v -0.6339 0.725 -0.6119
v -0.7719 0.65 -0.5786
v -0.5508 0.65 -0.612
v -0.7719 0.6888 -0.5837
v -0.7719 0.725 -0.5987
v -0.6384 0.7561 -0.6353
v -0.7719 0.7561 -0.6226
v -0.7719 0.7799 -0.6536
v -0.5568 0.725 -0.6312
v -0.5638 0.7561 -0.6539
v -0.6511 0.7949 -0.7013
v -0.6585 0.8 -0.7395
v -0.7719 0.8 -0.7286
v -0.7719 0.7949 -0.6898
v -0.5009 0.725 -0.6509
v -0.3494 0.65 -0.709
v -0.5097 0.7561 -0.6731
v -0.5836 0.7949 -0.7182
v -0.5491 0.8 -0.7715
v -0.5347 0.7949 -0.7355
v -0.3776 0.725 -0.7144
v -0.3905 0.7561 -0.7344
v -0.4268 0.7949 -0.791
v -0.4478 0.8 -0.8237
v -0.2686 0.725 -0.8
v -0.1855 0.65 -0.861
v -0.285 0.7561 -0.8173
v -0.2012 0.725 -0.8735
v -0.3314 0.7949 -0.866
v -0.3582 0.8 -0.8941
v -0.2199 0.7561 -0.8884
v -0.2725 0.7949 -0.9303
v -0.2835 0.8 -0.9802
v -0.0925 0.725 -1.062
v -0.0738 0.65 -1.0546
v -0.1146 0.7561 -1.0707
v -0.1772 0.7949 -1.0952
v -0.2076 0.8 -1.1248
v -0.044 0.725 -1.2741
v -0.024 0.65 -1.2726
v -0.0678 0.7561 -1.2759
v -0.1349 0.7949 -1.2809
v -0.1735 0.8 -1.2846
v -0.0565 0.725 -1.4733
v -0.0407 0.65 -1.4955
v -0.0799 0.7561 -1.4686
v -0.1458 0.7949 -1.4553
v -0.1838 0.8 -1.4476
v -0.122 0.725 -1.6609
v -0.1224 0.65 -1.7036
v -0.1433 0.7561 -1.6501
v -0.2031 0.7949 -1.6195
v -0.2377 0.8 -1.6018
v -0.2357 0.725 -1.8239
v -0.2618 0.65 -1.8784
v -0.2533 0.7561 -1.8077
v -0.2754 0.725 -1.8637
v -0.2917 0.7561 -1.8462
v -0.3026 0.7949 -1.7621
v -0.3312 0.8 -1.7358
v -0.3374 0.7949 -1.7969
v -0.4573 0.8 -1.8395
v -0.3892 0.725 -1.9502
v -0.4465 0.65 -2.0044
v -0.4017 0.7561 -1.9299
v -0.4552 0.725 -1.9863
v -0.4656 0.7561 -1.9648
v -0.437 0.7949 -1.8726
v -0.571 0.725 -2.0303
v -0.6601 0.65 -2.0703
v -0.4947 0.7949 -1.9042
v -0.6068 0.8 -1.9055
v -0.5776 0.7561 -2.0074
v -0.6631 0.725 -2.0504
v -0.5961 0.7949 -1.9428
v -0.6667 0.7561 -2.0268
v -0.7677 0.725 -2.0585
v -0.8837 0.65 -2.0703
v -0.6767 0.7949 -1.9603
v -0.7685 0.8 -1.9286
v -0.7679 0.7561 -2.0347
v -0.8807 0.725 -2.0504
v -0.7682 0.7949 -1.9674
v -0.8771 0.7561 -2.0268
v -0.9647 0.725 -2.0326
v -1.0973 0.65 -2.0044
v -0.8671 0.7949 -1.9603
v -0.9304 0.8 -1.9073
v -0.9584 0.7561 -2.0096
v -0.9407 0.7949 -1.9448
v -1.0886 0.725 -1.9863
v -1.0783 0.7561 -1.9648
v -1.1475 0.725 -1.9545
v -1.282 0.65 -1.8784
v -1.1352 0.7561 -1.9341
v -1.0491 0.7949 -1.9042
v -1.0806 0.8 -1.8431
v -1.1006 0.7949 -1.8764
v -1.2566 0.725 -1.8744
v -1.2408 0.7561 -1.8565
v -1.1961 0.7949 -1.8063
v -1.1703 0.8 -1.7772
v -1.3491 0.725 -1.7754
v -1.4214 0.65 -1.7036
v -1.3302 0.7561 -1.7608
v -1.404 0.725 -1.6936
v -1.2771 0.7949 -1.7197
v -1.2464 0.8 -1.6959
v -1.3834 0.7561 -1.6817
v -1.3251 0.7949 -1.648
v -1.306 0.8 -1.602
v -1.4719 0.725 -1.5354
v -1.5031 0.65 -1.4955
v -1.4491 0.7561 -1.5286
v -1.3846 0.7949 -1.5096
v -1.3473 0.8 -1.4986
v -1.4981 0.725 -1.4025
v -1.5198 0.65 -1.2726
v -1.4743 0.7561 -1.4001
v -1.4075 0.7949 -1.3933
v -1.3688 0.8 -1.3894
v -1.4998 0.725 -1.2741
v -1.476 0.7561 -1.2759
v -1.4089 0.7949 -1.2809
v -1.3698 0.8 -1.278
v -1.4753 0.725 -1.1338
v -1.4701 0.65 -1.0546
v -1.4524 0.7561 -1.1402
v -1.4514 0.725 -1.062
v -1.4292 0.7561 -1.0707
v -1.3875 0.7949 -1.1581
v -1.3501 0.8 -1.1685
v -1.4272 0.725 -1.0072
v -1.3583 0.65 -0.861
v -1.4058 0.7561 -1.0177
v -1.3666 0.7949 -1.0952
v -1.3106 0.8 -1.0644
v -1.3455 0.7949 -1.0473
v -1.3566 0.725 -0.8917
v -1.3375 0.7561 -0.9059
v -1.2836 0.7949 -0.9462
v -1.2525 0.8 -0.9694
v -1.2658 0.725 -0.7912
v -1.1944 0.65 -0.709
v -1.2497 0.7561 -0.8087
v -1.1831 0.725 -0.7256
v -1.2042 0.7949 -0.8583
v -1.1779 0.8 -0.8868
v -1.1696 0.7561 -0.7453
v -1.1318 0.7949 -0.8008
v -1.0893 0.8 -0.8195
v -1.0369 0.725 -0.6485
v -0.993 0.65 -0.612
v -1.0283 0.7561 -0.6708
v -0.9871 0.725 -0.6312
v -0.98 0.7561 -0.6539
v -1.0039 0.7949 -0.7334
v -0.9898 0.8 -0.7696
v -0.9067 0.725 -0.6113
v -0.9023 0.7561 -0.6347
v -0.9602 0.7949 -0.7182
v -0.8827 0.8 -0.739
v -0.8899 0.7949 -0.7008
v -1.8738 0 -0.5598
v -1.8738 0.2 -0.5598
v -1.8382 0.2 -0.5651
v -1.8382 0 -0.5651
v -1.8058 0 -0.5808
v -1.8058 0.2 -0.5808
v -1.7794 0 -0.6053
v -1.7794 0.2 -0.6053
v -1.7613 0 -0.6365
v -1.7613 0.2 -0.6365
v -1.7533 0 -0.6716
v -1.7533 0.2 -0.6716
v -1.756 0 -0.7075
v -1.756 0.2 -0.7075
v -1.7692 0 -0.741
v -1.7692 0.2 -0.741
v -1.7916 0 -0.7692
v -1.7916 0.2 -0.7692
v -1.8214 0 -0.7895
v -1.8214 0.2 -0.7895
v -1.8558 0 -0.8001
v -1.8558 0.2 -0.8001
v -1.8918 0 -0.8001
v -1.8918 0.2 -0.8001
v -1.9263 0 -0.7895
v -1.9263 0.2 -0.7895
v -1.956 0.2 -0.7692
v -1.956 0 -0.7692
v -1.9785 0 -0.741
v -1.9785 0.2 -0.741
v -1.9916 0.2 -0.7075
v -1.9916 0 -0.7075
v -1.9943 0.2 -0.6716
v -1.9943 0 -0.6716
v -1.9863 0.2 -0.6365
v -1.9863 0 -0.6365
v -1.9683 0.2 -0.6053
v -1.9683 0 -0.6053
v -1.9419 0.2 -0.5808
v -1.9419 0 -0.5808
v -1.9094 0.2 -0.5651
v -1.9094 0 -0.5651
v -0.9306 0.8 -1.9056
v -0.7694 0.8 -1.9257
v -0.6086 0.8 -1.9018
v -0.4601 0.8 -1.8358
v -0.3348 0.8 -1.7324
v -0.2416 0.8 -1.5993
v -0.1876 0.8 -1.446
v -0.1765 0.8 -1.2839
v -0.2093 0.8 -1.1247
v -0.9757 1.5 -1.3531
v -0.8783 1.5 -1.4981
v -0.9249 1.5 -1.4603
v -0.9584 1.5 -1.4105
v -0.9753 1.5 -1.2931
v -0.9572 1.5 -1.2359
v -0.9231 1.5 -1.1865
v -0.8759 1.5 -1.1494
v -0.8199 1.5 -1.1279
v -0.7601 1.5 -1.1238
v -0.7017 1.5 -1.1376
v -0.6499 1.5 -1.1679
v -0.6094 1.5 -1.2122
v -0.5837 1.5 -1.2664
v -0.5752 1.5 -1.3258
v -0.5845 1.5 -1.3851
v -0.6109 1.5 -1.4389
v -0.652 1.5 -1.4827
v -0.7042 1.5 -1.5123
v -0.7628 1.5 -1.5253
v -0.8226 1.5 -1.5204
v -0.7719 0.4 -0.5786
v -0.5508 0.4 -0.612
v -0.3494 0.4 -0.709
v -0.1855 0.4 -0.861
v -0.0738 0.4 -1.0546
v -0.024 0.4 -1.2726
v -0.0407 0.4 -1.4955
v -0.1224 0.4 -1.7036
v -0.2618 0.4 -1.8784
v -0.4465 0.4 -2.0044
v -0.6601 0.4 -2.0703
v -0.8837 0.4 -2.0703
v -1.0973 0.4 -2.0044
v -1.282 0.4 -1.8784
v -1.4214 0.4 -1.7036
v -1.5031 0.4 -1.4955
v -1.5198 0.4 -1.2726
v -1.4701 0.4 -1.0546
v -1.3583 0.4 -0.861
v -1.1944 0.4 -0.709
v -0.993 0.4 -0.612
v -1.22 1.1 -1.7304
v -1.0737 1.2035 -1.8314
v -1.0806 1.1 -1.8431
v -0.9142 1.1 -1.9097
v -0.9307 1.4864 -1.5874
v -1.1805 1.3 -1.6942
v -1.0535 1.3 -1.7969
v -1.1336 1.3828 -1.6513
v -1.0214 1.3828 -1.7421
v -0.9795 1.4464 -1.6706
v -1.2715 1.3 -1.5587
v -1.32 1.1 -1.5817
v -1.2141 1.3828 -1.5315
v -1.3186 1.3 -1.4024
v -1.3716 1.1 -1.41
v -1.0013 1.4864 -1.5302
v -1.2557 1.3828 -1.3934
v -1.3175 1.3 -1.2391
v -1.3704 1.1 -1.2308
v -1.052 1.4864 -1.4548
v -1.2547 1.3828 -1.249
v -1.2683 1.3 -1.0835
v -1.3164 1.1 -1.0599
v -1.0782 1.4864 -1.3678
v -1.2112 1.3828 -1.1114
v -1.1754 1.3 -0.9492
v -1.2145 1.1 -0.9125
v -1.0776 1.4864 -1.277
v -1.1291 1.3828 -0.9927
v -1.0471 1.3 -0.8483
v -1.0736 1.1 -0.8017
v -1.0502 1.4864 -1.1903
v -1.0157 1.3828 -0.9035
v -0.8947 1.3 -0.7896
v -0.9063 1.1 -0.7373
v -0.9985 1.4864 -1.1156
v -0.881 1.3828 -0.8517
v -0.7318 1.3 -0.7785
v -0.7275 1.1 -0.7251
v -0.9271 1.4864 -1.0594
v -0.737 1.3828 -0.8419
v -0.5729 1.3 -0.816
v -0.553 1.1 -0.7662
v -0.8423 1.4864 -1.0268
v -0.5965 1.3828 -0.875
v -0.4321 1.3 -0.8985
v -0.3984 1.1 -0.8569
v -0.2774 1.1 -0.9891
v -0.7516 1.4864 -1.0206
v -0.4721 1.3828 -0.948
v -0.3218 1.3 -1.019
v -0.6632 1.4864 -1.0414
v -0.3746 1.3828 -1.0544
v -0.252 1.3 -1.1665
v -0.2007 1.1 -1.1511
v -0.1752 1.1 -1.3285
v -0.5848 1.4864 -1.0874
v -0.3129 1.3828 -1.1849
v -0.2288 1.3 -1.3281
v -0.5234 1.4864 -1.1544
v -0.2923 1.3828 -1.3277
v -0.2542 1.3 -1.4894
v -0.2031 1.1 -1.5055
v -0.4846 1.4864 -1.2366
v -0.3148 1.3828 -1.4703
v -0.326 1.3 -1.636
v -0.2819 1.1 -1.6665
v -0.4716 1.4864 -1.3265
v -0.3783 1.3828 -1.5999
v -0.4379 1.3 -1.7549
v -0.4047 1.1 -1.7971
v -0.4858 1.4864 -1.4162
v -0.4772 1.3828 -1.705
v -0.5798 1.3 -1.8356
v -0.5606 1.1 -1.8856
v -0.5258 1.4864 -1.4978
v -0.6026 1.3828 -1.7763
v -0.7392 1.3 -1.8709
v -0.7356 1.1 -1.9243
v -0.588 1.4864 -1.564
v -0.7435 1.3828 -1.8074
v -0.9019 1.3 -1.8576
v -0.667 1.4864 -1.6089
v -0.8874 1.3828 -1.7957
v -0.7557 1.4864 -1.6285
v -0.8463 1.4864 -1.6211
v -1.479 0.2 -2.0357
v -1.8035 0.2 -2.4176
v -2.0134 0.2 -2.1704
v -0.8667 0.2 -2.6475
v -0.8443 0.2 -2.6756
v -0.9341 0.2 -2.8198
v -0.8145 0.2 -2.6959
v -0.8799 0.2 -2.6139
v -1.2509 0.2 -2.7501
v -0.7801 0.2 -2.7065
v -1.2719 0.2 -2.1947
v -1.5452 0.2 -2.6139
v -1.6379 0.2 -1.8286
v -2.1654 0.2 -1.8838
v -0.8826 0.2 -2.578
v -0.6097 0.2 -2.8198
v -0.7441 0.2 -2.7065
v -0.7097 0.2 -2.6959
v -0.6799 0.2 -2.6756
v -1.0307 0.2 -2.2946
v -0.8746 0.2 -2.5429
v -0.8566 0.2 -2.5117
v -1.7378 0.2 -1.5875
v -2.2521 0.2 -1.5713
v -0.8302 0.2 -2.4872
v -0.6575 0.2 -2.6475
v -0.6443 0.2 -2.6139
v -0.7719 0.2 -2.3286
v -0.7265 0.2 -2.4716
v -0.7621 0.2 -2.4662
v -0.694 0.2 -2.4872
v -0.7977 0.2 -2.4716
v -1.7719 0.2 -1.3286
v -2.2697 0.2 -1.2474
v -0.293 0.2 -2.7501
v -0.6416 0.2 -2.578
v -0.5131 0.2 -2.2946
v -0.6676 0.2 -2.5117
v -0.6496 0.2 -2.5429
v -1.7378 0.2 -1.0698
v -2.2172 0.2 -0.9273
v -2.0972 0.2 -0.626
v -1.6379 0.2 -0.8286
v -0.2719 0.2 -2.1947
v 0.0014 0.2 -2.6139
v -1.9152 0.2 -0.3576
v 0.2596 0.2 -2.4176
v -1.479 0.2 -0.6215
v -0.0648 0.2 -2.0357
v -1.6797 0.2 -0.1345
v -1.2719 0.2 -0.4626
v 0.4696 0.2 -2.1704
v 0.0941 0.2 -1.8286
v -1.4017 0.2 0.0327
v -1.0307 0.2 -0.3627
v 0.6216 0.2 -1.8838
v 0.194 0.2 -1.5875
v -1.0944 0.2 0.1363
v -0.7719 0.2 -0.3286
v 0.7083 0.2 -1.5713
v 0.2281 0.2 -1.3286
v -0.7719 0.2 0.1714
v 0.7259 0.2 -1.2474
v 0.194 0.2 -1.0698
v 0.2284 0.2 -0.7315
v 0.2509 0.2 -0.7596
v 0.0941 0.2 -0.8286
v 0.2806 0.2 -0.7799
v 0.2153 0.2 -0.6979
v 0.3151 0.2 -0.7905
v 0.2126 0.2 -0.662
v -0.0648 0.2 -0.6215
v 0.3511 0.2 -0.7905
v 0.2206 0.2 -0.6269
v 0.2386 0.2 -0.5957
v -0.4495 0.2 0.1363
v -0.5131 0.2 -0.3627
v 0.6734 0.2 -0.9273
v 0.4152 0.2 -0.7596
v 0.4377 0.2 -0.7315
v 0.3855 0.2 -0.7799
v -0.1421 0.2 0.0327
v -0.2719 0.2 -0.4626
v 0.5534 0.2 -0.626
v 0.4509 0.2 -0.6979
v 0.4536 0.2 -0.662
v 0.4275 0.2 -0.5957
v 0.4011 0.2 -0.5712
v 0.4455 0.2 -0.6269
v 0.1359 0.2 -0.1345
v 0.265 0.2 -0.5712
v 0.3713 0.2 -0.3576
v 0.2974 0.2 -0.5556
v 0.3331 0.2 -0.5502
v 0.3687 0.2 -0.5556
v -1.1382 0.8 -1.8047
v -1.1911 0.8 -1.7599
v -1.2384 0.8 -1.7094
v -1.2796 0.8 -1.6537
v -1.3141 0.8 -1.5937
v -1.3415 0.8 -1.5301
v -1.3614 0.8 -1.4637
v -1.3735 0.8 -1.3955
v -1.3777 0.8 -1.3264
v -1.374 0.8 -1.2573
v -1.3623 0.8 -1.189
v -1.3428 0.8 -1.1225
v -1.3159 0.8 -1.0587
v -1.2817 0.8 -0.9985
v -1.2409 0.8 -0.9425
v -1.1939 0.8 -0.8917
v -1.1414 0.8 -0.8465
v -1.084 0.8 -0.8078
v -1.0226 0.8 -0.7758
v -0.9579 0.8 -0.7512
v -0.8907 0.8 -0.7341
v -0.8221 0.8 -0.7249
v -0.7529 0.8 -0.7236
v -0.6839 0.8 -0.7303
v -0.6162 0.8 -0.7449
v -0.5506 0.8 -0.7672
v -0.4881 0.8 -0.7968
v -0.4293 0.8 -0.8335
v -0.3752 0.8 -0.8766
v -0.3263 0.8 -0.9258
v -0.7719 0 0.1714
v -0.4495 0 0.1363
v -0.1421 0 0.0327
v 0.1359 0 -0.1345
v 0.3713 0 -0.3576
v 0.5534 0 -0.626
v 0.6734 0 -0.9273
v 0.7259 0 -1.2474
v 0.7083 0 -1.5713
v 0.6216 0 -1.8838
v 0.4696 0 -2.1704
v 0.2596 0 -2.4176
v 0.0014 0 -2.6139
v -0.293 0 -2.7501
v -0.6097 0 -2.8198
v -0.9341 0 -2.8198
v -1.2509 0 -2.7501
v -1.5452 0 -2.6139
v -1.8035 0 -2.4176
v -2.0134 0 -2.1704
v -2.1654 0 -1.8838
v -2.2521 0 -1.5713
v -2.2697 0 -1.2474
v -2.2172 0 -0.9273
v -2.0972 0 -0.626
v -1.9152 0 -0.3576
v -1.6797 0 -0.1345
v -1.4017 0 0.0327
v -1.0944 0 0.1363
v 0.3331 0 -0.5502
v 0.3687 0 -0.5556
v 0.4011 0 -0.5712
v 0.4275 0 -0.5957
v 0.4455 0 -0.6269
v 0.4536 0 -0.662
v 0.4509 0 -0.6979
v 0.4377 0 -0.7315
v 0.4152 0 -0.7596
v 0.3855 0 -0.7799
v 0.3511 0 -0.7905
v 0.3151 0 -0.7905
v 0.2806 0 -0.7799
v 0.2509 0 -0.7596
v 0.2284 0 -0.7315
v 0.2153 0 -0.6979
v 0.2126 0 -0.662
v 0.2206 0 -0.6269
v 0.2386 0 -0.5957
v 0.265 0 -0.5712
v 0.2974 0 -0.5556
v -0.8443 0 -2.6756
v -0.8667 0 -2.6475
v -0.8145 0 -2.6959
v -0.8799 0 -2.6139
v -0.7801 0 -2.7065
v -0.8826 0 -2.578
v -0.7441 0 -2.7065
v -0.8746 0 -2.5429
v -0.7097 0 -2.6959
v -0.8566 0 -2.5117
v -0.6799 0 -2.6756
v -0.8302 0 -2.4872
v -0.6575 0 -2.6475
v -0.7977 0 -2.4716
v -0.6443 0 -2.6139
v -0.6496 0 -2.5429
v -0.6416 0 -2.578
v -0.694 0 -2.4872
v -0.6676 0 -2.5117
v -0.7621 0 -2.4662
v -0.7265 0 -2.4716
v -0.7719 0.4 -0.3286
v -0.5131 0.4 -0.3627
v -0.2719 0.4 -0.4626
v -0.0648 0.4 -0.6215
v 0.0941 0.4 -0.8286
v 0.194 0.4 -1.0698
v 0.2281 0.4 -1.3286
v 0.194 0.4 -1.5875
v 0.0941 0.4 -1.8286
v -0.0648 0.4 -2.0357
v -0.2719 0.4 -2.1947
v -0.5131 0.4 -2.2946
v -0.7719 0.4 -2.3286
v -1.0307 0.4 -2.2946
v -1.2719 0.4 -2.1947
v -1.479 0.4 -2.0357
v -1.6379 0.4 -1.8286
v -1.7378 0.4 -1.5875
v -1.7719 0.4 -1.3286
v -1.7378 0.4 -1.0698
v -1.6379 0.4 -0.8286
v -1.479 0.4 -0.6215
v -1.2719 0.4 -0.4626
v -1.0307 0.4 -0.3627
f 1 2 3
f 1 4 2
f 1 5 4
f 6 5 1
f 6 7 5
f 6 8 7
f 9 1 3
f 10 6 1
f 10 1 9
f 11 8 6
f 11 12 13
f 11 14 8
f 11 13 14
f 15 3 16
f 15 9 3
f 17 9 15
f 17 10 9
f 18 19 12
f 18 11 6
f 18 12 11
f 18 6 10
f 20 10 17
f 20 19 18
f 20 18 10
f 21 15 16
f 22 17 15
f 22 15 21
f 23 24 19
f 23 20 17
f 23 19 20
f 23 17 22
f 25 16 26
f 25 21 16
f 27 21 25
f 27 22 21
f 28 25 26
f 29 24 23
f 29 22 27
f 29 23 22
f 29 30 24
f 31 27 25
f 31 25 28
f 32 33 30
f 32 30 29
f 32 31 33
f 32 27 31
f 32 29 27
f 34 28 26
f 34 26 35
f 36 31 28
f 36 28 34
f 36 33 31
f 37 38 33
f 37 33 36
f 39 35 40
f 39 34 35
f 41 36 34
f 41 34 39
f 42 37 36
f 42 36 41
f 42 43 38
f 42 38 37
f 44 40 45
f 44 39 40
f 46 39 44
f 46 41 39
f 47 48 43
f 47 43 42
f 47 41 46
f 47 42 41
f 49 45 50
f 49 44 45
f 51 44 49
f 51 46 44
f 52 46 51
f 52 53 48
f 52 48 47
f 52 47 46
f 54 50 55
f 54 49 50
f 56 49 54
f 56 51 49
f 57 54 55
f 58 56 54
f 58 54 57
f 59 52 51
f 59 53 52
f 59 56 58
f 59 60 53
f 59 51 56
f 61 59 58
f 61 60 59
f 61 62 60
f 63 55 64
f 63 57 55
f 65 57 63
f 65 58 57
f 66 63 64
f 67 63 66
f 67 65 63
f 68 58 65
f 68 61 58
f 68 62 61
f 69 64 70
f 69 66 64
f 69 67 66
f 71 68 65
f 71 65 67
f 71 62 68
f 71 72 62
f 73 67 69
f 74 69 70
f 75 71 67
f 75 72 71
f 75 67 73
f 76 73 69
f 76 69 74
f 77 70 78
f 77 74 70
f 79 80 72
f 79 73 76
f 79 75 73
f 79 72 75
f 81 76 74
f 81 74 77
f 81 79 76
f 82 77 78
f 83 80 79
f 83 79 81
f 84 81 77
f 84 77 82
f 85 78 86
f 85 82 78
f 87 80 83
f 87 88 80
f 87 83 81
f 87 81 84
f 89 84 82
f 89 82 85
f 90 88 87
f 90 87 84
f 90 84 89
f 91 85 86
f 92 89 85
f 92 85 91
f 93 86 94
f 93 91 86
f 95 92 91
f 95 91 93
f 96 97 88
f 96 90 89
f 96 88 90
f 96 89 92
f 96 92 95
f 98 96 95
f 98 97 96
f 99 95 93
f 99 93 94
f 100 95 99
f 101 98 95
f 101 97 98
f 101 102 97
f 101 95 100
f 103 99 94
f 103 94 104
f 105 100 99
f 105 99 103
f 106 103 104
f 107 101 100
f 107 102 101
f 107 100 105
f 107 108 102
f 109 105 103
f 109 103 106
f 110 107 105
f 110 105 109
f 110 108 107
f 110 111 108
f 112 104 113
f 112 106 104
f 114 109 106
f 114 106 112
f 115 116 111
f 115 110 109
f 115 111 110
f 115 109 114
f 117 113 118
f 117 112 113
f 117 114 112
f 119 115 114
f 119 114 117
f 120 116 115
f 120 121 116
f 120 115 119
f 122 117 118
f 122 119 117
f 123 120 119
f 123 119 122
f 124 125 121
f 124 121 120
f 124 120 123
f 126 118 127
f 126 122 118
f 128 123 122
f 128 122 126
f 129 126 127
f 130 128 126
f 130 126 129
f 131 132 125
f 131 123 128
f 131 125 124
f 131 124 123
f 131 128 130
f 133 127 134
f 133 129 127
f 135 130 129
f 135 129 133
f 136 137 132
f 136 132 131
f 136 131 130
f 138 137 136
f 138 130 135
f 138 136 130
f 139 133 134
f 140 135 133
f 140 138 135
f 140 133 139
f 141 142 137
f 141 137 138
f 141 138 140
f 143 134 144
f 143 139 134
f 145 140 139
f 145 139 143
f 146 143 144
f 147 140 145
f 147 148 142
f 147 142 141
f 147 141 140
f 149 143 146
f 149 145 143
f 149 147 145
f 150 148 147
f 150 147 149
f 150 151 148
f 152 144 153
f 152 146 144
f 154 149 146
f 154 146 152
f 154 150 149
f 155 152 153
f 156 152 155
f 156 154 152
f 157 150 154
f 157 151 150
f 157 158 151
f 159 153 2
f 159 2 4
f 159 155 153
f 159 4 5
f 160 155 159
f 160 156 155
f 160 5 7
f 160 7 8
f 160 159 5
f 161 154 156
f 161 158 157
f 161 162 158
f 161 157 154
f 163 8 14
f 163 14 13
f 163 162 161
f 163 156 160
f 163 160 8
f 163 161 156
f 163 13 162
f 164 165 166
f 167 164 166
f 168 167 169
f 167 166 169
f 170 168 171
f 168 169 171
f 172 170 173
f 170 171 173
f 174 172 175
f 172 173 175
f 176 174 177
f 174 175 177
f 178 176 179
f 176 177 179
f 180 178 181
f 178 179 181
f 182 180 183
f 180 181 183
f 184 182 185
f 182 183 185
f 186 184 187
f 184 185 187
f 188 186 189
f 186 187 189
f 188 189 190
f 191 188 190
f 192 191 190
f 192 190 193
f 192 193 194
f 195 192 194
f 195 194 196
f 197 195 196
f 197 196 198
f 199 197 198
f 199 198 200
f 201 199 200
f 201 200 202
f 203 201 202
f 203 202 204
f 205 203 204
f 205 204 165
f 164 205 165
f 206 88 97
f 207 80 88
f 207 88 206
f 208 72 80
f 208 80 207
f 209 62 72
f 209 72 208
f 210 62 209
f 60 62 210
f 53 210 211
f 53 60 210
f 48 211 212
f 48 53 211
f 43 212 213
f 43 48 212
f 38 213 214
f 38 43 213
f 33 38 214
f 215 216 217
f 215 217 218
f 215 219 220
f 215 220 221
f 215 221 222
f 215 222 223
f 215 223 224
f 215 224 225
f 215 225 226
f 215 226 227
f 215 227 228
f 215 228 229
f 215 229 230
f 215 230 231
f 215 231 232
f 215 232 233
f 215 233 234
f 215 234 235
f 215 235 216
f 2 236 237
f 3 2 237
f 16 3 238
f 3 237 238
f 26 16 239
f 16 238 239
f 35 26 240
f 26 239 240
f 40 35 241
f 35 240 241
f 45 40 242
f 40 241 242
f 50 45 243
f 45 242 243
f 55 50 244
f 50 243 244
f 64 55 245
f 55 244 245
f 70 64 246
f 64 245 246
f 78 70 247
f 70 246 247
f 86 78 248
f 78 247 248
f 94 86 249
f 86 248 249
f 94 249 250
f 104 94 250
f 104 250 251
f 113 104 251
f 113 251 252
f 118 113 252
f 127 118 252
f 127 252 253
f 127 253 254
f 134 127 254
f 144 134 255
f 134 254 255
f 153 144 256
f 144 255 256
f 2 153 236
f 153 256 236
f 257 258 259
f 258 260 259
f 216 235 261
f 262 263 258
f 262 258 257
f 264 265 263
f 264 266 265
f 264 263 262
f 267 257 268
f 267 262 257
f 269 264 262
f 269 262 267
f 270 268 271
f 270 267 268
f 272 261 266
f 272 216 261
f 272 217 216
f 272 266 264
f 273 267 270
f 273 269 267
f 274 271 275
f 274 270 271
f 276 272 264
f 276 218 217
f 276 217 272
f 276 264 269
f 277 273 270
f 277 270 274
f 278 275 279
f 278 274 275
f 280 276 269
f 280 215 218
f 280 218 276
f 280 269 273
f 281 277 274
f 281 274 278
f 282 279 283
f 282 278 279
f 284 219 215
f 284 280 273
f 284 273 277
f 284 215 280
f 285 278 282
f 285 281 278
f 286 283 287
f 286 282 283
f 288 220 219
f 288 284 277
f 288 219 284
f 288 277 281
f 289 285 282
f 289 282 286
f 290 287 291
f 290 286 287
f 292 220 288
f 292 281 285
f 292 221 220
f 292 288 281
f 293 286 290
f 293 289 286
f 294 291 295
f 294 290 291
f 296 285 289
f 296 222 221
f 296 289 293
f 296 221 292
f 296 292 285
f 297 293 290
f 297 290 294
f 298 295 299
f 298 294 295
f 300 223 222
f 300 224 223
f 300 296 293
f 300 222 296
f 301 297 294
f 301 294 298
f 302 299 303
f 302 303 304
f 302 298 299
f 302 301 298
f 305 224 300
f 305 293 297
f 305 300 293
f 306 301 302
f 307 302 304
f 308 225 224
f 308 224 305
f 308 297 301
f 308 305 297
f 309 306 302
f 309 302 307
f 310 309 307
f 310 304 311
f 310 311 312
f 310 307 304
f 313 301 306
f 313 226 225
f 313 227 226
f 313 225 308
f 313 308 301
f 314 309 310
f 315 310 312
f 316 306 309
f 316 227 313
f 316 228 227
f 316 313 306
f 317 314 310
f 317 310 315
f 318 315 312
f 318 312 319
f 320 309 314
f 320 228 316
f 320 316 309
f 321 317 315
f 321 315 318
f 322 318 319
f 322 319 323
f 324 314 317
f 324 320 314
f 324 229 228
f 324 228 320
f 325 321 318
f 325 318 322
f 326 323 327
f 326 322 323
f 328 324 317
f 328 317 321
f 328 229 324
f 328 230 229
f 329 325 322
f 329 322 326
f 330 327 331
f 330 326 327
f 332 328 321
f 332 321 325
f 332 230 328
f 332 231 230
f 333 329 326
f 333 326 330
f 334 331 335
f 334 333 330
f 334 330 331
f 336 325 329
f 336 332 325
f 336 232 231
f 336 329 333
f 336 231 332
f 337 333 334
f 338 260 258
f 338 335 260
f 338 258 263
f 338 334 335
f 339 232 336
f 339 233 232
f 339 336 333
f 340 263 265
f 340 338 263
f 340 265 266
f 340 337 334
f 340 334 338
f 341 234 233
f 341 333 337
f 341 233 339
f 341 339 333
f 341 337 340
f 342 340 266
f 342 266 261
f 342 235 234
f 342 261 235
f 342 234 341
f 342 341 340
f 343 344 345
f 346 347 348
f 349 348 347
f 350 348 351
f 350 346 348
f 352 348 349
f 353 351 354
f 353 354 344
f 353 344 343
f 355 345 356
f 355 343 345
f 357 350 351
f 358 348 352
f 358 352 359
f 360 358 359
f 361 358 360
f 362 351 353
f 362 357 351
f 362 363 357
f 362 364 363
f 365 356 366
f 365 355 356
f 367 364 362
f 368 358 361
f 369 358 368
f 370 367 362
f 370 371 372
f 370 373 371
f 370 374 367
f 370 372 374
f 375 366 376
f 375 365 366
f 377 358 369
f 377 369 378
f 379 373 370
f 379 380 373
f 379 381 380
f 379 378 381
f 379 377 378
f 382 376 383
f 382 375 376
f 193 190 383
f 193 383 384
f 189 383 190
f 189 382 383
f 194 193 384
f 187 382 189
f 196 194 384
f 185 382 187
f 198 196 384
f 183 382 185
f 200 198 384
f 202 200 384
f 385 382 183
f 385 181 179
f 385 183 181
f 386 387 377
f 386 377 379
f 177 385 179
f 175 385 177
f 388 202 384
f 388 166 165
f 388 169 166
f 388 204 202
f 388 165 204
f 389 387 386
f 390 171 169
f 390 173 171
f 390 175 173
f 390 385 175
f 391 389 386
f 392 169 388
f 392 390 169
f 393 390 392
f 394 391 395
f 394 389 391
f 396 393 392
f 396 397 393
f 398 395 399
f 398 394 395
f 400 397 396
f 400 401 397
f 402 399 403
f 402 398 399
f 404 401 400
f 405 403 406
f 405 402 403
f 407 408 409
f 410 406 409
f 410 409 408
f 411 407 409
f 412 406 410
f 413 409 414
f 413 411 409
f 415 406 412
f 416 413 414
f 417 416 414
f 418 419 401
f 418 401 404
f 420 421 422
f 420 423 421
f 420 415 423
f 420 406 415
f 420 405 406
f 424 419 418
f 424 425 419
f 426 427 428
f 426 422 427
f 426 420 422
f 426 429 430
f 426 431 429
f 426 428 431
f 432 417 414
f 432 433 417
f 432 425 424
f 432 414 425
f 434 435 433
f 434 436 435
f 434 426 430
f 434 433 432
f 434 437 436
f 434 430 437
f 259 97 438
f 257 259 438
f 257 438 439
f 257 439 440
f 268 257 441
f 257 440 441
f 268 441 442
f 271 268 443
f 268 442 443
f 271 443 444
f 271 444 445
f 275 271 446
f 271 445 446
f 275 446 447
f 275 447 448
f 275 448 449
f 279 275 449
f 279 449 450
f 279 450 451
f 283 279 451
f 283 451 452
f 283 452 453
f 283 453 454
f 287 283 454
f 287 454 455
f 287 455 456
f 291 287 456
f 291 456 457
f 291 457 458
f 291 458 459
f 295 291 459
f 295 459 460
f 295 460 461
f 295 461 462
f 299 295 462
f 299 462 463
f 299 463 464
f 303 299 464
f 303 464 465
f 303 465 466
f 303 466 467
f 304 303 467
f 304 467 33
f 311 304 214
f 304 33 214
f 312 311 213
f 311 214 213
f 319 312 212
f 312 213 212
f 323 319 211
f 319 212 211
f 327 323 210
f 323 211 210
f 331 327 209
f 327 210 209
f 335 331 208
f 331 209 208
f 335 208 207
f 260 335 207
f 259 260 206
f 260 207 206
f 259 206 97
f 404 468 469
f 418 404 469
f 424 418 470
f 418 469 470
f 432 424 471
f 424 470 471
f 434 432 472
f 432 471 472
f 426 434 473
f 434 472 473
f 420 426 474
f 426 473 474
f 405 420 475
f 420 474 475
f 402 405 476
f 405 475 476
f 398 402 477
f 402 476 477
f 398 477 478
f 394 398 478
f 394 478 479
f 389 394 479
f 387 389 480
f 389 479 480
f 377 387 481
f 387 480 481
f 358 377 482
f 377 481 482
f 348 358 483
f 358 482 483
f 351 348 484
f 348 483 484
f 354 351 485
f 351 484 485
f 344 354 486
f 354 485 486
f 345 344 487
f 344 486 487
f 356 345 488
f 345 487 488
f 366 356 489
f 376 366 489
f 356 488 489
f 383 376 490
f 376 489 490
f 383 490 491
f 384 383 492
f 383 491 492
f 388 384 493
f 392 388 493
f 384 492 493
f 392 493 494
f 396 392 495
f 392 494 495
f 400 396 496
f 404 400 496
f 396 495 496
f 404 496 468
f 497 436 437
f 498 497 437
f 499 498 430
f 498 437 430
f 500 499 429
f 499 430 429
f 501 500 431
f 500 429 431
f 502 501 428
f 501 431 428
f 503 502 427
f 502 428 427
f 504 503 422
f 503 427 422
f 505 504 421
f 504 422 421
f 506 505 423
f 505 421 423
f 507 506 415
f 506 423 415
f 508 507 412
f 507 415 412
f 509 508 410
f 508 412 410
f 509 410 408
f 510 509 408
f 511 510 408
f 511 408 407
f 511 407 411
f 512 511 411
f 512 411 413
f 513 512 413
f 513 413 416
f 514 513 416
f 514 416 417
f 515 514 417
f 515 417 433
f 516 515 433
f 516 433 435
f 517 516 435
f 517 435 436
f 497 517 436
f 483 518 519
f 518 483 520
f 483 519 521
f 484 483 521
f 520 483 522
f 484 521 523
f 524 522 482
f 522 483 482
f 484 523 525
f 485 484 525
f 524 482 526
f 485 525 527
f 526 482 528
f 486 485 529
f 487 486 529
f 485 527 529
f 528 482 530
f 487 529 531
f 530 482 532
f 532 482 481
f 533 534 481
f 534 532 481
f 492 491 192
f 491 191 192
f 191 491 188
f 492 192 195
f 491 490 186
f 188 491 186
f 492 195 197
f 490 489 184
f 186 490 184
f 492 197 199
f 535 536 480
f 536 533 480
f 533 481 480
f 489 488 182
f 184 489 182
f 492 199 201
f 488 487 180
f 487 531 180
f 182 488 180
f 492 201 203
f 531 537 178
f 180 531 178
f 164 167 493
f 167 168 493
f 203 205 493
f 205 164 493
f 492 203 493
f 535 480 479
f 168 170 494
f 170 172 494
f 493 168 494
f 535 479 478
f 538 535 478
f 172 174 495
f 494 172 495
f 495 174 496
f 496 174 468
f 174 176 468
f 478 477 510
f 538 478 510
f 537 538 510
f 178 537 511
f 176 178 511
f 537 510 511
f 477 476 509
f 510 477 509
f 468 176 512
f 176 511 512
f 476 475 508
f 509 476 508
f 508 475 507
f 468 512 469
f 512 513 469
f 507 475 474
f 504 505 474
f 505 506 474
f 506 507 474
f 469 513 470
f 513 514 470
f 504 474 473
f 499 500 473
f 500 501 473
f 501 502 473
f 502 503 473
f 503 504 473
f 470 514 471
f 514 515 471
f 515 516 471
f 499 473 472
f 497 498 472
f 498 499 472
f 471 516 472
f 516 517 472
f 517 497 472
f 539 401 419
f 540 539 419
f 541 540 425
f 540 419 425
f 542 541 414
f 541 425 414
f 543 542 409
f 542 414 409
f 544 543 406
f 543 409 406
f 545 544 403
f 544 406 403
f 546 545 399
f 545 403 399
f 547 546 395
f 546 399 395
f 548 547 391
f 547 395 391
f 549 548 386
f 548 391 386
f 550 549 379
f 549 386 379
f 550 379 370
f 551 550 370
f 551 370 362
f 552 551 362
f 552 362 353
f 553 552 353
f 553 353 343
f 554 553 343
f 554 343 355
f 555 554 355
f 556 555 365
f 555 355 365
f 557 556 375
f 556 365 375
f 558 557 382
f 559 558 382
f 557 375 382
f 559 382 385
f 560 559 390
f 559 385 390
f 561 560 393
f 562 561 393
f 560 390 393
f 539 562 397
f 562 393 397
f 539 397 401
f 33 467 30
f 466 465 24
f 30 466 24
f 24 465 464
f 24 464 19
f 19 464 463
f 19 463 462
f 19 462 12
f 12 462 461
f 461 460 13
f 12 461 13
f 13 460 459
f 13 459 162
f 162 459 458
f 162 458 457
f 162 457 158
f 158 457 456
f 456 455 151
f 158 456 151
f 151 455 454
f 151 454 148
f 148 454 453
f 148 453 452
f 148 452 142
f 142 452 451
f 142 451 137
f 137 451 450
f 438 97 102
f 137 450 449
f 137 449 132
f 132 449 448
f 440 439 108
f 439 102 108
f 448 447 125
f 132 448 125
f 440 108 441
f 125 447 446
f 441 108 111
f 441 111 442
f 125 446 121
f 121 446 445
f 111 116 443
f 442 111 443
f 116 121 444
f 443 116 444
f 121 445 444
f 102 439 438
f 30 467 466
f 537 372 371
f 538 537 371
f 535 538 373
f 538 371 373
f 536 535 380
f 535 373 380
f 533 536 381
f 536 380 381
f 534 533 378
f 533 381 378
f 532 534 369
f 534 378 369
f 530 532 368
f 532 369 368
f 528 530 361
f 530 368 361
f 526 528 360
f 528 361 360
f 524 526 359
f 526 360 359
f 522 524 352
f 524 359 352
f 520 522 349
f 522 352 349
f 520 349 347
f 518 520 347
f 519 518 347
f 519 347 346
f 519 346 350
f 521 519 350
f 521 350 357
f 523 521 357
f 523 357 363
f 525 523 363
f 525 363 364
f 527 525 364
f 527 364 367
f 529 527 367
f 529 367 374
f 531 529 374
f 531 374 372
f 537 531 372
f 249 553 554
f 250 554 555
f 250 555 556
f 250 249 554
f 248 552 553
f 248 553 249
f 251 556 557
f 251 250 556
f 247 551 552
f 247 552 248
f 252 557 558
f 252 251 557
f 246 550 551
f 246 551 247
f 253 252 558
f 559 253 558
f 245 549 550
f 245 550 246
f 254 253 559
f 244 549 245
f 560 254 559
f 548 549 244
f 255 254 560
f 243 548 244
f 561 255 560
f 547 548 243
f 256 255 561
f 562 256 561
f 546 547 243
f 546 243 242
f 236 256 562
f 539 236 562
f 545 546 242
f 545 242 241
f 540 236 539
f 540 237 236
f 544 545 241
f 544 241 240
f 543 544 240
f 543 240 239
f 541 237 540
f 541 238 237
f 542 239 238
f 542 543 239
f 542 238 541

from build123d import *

# Parameters (mm, degrees)
SKETCH1_R           = 1.5
BOSS_EXTRUDE1_DEPTH = 0.2
SKETCH2_R           = 1
BOSS_EXTRUDE2_DEPTH = 0.2
SKETCH3_R           = 0.75
BOSS_EXTRUDE3_DEPTH = 0.4
FILLET1_R           = 0.15
SKETCH7_R           = 0.601293839
BOSS_EXTRUDE4_DEPTH = 0.7
FILLET2_R           = 0.4
SKETCH8_R           = 0.120832219
CUT_EXTRUDE1_DEPTH  = 0.7


with BuildPart() as part:
    # Sketch1 → Boss-Extrude1 (new body)
    with BuildSketch(Plane(origin=(0, 0, 0), x_dir=(1, 0, 0), z_dir=(0, 1, 0))):
        with Locations(Location((-0.771907226, 1.328636773, 0), (0, 0, 270))):
            Circle(SKETCH1_R)
    extrude(amount=BOSS_EXTRUDE1_DEPTH)

    # Sketch2 → Boss-Extrude2 (add)
    with BuildSketch(Plane(origin=(0, 0.2, 0), x_dir=(1, 0, 0), z_dir=(0, 1, 0))):
        with Locations(Location((-0.771907226, 1.328636773, 0), (0, 0, 270))):
            Circle(SKETCH2_R)
    extrude(amount=BOSS_EXTRUDE2_DEPTH)

    # Sketch3 → Boss-Extrude3 (add)
    with BuildSketch(Plane(origin=(0, 0.4, 0), x_dir=(1, 0, 0), z_dir=(0, 1, 0))):
        with Locations(Location((-0.771907226, 1.328636773, 0), (0, 0, 270))):
            Circle(SKETCH3_R)
    extrude(amount=BOSS_EXTRUDE3_DEPTH)

    # Fillet1
    fillet1_edges = [part.edges().sort_by_distance(p)[0] for p in [
        (-0.771907226, 0.8, -2.078636773),
    ]]
    fillet(fillet1_edges, radius=FILLET1_R)

    # Sketch7 → Boss-Extrude4 (add)
    with BuildSketch(Plane(origin=(0, 0.8, 0), x_dir=(1, 0, 0), z_dir=(0, 1, 0))):
        with Locations(Location((-0.776458573, 1.324432574, 0), (0, 0, 120.387457417))):
            Circle(SKETCH7_R)
    extrude(amount=BOSS_EXTRUDE4_DEPTH)

    # Fillet2
    fillet2_edges = [part.edges().sort_by_distance(p)[0] for p in [
        (-0.472297127, 1.5, -0.805741822),
    ]]
    fillet(fillet2_edges, radius=FILLET2_R)

    # Sketch8 → Cut-Extrude1 (cut)
    with BuildSketch(Plane(origin=(0, 0.2, 0), x_dir=(1, 0, 0), z_dir=(0, 1, 0))):
        with Locations(Location((-0.762097508, 2.587051024, 0), (0, 0, 270))):
            Circle(SKETCH8_R)
        with Locations(Location((0.333062694, 0.671048981, 0), (0, 0, 270))):
            Circle(SKETCH8_R)
        with Locations(Location((-1.87382385, 0.680613446, 0), (0, 0, 270))):
            Circle(SKETCH8_R)
    extrude(amount=-CUT_EXTRUDE1_DEPTH, mode=Mode.SUBTRACT)


solid = part.part
